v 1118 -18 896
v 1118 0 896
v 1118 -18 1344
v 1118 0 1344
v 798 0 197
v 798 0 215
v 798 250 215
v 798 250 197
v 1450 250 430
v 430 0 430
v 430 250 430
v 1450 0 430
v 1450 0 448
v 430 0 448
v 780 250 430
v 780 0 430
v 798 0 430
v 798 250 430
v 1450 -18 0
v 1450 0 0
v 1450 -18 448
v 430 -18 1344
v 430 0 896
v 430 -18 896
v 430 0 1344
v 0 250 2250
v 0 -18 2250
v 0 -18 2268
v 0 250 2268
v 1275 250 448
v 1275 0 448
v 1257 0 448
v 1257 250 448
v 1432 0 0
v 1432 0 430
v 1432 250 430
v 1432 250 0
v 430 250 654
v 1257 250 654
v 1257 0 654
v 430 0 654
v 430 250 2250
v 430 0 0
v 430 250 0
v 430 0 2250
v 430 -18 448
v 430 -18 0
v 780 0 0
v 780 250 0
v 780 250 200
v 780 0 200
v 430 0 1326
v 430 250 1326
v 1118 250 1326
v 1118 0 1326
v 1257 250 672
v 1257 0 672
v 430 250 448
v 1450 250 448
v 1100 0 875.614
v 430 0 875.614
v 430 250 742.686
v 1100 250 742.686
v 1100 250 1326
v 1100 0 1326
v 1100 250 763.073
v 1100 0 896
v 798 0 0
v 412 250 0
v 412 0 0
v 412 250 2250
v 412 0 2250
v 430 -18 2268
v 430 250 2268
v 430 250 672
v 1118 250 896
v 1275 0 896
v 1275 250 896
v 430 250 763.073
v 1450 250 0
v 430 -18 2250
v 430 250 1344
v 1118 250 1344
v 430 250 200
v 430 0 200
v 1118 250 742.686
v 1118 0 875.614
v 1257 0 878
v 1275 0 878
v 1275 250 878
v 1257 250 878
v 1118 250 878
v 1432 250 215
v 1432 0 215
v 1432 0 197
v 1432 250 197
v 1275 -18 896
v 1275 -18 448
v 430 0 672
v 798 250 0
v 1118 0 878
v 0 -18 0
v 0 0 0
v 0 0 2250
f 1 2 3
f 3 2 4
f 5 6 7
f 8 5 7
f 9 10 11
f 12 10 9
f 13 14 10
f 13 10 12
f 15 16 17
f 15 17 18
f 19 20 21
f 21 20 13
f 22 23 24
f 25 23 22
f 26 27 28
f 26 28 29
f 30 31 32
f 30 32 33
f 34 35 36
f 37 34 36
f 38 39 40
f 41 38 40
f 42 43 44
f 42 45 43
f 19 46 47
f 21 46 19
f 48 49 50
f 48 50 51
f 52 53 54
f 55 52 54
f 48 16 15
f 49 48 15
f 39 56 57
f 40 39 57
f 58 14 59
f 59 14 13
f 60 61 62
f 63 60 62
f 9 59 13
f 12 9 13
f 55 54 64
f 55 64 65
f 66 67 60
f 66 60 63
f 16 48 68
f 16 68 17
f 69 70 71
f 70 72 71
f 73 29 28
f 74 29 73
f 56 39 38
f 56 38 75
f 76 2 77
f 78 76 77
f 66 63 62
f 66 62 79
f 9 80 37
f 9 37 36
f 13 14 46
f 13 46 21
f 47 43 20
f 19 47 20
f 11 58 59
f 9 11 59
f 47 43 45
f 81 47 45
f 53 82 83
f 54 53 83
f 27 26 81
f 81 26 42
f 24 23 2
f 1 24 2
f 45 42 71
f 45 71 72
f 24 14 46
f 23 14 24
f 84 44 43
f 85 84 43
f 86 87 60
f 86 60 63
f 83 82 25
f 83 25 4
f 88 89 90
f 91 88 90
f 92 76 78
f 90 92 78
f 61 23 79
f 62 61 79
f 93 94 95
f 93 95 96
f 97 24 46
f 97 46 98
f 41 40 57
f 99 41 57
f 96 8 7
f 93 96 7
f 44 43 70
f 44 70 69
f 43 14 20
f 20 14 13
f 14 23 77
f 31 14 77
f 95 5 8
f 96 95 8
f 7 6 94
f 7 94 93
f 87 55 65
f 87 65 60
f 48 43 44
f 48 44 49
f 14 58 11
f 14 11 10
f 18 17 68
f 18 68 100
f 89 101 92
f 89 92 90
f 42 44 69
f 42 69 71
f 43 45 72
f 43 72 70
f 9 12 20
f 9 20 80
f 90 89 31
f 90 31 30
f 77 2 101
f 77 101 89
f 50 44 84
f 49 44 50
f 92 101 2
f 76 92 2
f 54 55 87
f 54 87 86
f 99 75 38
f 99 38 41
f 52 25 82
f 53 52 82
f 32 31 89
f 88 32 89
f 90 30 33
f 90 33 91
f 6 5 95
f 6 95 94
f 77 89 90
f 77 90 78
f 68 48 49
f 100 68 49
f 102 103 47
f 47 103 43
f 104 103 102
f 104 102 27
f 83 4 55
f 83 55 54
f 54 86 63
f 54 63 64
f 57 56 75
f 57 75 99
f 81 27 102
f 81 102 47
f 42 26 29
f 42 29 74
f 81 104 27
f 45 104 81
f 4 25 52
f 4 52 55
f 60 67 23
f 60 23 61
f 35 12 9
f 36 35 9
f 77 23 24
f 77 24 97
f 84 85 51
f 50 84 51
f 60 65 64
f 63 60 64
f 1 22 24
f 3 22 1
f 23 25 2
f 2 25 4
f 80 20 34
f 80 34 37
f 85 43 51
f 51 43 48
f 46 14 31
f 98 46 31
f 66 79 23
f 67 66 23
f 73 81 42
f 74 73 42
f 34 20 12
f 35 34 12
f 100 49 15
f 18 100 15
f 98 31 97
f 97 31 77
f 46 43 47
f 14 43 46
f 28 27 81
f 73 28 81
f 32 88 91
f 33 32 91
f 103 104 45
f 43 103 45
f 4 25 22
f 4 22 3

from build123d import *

# Parameters (mm, degrees)
F3_W      = 688
F3_H      = 448
F4_DEPTH  = 18
F2_W      = 845
F2_H      = 448
F1_W      = 1020
F1_H      = 448
F0_W      = 430
F0_H      = 2250
F6_DEPTH  = 18
F7_W      = 250
F7_H      = 430
F8_DEPTH  = 18
F9_W      = 1020
F9_H      = 250
F10_DEPTH = 18
F11_W     = 250
F11_H     = 430
F12_DEPTH = 18
F13_W     = 350
F13_H     = 250
F14_DEPTH = 200
F15_W     = 430
F15_H     = 268
F16_DEPTH = 18
F17_W     = 250
F17_H     = 430
F18_DEPTH = 18
F19_W     = 250
F19_H     = 18
F20_DEPTH = 634
F21_W     = 250
F21_H     = 18
F22_DEPTH = 827
F24_W     = 688
F24_H     = 250
F25_DEPTH = 18
F27_DEPTH = 18
F29_DEPTH = 670
F28_W     = 157
F28_H     = 18
F30_DEPTH = 250
F31_DEPTH = 250


with BuildPart() as f4:
    # F3 (on Front) → F4 (new body)
    with BuildSketch(Plane.XZ):
        with Locations((774, 1120)):
            Rectangle(F3_W, F3_H)
    extrude(amount=F4_DEPTH)


with BuildPart() as f4b:
    # F2 (on Front) → F4, piece 2 (new body)
    with BuildSketch(Plane.XZ):
        with Locations((852.5, 672)):
            Rectangle(F2_W, F2_H)
    extrude(amount=F4_DEPTH)


with BuildPart() as f4c:
    # F1 (on Front) → F4, piece 3 (new body)
    with BuildSketch(Plane.XZ):
        with Locations((940, 224)):
            Rectangle(F1_W, F1_H)
    extrude(amount=F4_DEPTH)


with BuildPart() as f4d:
    # F0 (on Front) → F4, piece 4 (new body)
    with BuildSketch(Plane.XZ):
        with Locations((215, 1125)):
            Rectangle(F0_W, F0_H)
    extrude(amount=F4_DEPTH)


with BuildPart() as f6:
    # F5 (on face) → F6 (new body)
    with BuildSketch(Plane.YZ.offset(430)):
        Polygon((0, 896), (0, 0), (250, 0), (250, 2250), (0, 2250), (0, 1344), align=None)
    extrude(amount=-F6_DEPTH)


with BuildPart() as f8:
    # F7 (on face) → F8 (new body)
    with BuildSketch(Plane.YZ.offset(1275)):
        with Locations((125, 663)):
            Rectangle(F7_W, F7_H)
    extrude(amount=-F8_DEPTH)


with BuildPart() as f10:
    # F9 (on face) → F10 (new body)
    with BuildSketch(Plane(origin=(0, 0, 448), x_dir=(1, 0, 0), z_dir=(0, 0, -1))):
        with Locations((940, -125)):
            Rectangle(F9_W, F9_H)
    extrude(amount=F10_DEPTH)


with BuildPart() as f12:
    # F11 (on face) → F12 (new body)
    with BuildSketch(Plane.YZ.offset(1450)):
        with Locations((125, 215)):
            Rectangle(F11_W, F11_H)
    extrude(amount=-F12_DEPTH)


with BuildPart() as f14:
    # F13 (on face) → F14 (new body)
    with BuildSketch(Plane(origin=(0, 0, 0), x_dir=(1, 0, 0), z_dir=(0, 0, -1))):
        with Locations((605, -125)):
            Rectangle(F13_W, F13_H)
    extrude(amount=-F14_DEPTH)


with BuildPart() as f16:
    # F15 (on face) → F16 (new body)
    with BuildSketch(Plane.XY.offset(2250)):
        with Locations((215, 116)):
            Rectangle(F15_W, F15_H)
    extrude(amount=F16_DEPTH)


with BuildPart() as f18:
    # F17 (on face) → F18 (new body)
    with BuildSketch(Plane.YZ.offset(780)):
        with Locations((125, 215)):
            Rectangle(F17_W, F17_H)
    extrude(amount=F18_DEPTH)


with BuildPart() as f20:
    # F19 (on face) → F20 (new body, through all)
    with BuildSketch(Plane.YZ.offset(798)):
        with Locations((125, 206)):
            Rectangle(F19_W, F19_H)
    extrude(amount=F20_DEPTH)


with BuildPart() as f22:
    # F21 (on face) → F22 (new body, through all)
    with BuildSketch(Plane(origin=(1257, 0, 0), x_dir=(0, -1, 0), z_dir=(-1, 0, 0))):
        with Locations((-125, 663)):
            Rectangle(F21_W, F21_H)
    extrude(amount=F22_DEPTH)


with BuildPart() as f25:
    # F24 (on face) → F25 (new body)
    with BuildSketch(Plane.XY.offset(1344)):
        with Locations((774, 125)):
            Rectangle(F24_W, F24_H)
    extrude(amount=-F25_DEPTH)


with BuildPart() as f27:
    # F26 (on face) → F27 (new body)
    with BuildSketch(Plane.YZ.offset(1118)):
        Polygon((250, 1326), (0, 1326), (0, 896), (0, 875.6137390876), (250, 742.6863811722), align=None)
    extrude(amount=-F27_DEPTH)


with BuildPart() as f29:
    # F23 (on face) → F29 (new body, through all)
    with BuildSketch(Plane.YZ.offset(430)):
        Polygon((250, 742.6863811722), (250, 763.0726420846), (0, 896), (0, 875.6137390876), align=None)
    extrude(amount=F29_DEPTH)


with BuildPart() as f30:
    # F28 (on face) → F30 (new body, through all)
    with BuildSketch(Plane.XZ):
        with Locations((1196.5, 887)):
            Rectangle(F28_W, F28_H)
    extrude(amount=-F30_DEPTH)


with BuildPart() as f31:
    # F28 (on face) → F31 (new body, through all)
    with BuildSketch(Plane.XZ):
        with Locations((1196.5, 887)):
            Rectangle(F28_W, F28_H)
    extrude(amount=-F31_DEPTH)


solid = Compound([f4.part, f4b.part, f4c.part, f4d.part, f6.part, f8.part, f10.part, f12.part, f14.part, f16.part, f18.part, f20.part, f22.part, f25.part, f27.part, f29.part, f30.part])
